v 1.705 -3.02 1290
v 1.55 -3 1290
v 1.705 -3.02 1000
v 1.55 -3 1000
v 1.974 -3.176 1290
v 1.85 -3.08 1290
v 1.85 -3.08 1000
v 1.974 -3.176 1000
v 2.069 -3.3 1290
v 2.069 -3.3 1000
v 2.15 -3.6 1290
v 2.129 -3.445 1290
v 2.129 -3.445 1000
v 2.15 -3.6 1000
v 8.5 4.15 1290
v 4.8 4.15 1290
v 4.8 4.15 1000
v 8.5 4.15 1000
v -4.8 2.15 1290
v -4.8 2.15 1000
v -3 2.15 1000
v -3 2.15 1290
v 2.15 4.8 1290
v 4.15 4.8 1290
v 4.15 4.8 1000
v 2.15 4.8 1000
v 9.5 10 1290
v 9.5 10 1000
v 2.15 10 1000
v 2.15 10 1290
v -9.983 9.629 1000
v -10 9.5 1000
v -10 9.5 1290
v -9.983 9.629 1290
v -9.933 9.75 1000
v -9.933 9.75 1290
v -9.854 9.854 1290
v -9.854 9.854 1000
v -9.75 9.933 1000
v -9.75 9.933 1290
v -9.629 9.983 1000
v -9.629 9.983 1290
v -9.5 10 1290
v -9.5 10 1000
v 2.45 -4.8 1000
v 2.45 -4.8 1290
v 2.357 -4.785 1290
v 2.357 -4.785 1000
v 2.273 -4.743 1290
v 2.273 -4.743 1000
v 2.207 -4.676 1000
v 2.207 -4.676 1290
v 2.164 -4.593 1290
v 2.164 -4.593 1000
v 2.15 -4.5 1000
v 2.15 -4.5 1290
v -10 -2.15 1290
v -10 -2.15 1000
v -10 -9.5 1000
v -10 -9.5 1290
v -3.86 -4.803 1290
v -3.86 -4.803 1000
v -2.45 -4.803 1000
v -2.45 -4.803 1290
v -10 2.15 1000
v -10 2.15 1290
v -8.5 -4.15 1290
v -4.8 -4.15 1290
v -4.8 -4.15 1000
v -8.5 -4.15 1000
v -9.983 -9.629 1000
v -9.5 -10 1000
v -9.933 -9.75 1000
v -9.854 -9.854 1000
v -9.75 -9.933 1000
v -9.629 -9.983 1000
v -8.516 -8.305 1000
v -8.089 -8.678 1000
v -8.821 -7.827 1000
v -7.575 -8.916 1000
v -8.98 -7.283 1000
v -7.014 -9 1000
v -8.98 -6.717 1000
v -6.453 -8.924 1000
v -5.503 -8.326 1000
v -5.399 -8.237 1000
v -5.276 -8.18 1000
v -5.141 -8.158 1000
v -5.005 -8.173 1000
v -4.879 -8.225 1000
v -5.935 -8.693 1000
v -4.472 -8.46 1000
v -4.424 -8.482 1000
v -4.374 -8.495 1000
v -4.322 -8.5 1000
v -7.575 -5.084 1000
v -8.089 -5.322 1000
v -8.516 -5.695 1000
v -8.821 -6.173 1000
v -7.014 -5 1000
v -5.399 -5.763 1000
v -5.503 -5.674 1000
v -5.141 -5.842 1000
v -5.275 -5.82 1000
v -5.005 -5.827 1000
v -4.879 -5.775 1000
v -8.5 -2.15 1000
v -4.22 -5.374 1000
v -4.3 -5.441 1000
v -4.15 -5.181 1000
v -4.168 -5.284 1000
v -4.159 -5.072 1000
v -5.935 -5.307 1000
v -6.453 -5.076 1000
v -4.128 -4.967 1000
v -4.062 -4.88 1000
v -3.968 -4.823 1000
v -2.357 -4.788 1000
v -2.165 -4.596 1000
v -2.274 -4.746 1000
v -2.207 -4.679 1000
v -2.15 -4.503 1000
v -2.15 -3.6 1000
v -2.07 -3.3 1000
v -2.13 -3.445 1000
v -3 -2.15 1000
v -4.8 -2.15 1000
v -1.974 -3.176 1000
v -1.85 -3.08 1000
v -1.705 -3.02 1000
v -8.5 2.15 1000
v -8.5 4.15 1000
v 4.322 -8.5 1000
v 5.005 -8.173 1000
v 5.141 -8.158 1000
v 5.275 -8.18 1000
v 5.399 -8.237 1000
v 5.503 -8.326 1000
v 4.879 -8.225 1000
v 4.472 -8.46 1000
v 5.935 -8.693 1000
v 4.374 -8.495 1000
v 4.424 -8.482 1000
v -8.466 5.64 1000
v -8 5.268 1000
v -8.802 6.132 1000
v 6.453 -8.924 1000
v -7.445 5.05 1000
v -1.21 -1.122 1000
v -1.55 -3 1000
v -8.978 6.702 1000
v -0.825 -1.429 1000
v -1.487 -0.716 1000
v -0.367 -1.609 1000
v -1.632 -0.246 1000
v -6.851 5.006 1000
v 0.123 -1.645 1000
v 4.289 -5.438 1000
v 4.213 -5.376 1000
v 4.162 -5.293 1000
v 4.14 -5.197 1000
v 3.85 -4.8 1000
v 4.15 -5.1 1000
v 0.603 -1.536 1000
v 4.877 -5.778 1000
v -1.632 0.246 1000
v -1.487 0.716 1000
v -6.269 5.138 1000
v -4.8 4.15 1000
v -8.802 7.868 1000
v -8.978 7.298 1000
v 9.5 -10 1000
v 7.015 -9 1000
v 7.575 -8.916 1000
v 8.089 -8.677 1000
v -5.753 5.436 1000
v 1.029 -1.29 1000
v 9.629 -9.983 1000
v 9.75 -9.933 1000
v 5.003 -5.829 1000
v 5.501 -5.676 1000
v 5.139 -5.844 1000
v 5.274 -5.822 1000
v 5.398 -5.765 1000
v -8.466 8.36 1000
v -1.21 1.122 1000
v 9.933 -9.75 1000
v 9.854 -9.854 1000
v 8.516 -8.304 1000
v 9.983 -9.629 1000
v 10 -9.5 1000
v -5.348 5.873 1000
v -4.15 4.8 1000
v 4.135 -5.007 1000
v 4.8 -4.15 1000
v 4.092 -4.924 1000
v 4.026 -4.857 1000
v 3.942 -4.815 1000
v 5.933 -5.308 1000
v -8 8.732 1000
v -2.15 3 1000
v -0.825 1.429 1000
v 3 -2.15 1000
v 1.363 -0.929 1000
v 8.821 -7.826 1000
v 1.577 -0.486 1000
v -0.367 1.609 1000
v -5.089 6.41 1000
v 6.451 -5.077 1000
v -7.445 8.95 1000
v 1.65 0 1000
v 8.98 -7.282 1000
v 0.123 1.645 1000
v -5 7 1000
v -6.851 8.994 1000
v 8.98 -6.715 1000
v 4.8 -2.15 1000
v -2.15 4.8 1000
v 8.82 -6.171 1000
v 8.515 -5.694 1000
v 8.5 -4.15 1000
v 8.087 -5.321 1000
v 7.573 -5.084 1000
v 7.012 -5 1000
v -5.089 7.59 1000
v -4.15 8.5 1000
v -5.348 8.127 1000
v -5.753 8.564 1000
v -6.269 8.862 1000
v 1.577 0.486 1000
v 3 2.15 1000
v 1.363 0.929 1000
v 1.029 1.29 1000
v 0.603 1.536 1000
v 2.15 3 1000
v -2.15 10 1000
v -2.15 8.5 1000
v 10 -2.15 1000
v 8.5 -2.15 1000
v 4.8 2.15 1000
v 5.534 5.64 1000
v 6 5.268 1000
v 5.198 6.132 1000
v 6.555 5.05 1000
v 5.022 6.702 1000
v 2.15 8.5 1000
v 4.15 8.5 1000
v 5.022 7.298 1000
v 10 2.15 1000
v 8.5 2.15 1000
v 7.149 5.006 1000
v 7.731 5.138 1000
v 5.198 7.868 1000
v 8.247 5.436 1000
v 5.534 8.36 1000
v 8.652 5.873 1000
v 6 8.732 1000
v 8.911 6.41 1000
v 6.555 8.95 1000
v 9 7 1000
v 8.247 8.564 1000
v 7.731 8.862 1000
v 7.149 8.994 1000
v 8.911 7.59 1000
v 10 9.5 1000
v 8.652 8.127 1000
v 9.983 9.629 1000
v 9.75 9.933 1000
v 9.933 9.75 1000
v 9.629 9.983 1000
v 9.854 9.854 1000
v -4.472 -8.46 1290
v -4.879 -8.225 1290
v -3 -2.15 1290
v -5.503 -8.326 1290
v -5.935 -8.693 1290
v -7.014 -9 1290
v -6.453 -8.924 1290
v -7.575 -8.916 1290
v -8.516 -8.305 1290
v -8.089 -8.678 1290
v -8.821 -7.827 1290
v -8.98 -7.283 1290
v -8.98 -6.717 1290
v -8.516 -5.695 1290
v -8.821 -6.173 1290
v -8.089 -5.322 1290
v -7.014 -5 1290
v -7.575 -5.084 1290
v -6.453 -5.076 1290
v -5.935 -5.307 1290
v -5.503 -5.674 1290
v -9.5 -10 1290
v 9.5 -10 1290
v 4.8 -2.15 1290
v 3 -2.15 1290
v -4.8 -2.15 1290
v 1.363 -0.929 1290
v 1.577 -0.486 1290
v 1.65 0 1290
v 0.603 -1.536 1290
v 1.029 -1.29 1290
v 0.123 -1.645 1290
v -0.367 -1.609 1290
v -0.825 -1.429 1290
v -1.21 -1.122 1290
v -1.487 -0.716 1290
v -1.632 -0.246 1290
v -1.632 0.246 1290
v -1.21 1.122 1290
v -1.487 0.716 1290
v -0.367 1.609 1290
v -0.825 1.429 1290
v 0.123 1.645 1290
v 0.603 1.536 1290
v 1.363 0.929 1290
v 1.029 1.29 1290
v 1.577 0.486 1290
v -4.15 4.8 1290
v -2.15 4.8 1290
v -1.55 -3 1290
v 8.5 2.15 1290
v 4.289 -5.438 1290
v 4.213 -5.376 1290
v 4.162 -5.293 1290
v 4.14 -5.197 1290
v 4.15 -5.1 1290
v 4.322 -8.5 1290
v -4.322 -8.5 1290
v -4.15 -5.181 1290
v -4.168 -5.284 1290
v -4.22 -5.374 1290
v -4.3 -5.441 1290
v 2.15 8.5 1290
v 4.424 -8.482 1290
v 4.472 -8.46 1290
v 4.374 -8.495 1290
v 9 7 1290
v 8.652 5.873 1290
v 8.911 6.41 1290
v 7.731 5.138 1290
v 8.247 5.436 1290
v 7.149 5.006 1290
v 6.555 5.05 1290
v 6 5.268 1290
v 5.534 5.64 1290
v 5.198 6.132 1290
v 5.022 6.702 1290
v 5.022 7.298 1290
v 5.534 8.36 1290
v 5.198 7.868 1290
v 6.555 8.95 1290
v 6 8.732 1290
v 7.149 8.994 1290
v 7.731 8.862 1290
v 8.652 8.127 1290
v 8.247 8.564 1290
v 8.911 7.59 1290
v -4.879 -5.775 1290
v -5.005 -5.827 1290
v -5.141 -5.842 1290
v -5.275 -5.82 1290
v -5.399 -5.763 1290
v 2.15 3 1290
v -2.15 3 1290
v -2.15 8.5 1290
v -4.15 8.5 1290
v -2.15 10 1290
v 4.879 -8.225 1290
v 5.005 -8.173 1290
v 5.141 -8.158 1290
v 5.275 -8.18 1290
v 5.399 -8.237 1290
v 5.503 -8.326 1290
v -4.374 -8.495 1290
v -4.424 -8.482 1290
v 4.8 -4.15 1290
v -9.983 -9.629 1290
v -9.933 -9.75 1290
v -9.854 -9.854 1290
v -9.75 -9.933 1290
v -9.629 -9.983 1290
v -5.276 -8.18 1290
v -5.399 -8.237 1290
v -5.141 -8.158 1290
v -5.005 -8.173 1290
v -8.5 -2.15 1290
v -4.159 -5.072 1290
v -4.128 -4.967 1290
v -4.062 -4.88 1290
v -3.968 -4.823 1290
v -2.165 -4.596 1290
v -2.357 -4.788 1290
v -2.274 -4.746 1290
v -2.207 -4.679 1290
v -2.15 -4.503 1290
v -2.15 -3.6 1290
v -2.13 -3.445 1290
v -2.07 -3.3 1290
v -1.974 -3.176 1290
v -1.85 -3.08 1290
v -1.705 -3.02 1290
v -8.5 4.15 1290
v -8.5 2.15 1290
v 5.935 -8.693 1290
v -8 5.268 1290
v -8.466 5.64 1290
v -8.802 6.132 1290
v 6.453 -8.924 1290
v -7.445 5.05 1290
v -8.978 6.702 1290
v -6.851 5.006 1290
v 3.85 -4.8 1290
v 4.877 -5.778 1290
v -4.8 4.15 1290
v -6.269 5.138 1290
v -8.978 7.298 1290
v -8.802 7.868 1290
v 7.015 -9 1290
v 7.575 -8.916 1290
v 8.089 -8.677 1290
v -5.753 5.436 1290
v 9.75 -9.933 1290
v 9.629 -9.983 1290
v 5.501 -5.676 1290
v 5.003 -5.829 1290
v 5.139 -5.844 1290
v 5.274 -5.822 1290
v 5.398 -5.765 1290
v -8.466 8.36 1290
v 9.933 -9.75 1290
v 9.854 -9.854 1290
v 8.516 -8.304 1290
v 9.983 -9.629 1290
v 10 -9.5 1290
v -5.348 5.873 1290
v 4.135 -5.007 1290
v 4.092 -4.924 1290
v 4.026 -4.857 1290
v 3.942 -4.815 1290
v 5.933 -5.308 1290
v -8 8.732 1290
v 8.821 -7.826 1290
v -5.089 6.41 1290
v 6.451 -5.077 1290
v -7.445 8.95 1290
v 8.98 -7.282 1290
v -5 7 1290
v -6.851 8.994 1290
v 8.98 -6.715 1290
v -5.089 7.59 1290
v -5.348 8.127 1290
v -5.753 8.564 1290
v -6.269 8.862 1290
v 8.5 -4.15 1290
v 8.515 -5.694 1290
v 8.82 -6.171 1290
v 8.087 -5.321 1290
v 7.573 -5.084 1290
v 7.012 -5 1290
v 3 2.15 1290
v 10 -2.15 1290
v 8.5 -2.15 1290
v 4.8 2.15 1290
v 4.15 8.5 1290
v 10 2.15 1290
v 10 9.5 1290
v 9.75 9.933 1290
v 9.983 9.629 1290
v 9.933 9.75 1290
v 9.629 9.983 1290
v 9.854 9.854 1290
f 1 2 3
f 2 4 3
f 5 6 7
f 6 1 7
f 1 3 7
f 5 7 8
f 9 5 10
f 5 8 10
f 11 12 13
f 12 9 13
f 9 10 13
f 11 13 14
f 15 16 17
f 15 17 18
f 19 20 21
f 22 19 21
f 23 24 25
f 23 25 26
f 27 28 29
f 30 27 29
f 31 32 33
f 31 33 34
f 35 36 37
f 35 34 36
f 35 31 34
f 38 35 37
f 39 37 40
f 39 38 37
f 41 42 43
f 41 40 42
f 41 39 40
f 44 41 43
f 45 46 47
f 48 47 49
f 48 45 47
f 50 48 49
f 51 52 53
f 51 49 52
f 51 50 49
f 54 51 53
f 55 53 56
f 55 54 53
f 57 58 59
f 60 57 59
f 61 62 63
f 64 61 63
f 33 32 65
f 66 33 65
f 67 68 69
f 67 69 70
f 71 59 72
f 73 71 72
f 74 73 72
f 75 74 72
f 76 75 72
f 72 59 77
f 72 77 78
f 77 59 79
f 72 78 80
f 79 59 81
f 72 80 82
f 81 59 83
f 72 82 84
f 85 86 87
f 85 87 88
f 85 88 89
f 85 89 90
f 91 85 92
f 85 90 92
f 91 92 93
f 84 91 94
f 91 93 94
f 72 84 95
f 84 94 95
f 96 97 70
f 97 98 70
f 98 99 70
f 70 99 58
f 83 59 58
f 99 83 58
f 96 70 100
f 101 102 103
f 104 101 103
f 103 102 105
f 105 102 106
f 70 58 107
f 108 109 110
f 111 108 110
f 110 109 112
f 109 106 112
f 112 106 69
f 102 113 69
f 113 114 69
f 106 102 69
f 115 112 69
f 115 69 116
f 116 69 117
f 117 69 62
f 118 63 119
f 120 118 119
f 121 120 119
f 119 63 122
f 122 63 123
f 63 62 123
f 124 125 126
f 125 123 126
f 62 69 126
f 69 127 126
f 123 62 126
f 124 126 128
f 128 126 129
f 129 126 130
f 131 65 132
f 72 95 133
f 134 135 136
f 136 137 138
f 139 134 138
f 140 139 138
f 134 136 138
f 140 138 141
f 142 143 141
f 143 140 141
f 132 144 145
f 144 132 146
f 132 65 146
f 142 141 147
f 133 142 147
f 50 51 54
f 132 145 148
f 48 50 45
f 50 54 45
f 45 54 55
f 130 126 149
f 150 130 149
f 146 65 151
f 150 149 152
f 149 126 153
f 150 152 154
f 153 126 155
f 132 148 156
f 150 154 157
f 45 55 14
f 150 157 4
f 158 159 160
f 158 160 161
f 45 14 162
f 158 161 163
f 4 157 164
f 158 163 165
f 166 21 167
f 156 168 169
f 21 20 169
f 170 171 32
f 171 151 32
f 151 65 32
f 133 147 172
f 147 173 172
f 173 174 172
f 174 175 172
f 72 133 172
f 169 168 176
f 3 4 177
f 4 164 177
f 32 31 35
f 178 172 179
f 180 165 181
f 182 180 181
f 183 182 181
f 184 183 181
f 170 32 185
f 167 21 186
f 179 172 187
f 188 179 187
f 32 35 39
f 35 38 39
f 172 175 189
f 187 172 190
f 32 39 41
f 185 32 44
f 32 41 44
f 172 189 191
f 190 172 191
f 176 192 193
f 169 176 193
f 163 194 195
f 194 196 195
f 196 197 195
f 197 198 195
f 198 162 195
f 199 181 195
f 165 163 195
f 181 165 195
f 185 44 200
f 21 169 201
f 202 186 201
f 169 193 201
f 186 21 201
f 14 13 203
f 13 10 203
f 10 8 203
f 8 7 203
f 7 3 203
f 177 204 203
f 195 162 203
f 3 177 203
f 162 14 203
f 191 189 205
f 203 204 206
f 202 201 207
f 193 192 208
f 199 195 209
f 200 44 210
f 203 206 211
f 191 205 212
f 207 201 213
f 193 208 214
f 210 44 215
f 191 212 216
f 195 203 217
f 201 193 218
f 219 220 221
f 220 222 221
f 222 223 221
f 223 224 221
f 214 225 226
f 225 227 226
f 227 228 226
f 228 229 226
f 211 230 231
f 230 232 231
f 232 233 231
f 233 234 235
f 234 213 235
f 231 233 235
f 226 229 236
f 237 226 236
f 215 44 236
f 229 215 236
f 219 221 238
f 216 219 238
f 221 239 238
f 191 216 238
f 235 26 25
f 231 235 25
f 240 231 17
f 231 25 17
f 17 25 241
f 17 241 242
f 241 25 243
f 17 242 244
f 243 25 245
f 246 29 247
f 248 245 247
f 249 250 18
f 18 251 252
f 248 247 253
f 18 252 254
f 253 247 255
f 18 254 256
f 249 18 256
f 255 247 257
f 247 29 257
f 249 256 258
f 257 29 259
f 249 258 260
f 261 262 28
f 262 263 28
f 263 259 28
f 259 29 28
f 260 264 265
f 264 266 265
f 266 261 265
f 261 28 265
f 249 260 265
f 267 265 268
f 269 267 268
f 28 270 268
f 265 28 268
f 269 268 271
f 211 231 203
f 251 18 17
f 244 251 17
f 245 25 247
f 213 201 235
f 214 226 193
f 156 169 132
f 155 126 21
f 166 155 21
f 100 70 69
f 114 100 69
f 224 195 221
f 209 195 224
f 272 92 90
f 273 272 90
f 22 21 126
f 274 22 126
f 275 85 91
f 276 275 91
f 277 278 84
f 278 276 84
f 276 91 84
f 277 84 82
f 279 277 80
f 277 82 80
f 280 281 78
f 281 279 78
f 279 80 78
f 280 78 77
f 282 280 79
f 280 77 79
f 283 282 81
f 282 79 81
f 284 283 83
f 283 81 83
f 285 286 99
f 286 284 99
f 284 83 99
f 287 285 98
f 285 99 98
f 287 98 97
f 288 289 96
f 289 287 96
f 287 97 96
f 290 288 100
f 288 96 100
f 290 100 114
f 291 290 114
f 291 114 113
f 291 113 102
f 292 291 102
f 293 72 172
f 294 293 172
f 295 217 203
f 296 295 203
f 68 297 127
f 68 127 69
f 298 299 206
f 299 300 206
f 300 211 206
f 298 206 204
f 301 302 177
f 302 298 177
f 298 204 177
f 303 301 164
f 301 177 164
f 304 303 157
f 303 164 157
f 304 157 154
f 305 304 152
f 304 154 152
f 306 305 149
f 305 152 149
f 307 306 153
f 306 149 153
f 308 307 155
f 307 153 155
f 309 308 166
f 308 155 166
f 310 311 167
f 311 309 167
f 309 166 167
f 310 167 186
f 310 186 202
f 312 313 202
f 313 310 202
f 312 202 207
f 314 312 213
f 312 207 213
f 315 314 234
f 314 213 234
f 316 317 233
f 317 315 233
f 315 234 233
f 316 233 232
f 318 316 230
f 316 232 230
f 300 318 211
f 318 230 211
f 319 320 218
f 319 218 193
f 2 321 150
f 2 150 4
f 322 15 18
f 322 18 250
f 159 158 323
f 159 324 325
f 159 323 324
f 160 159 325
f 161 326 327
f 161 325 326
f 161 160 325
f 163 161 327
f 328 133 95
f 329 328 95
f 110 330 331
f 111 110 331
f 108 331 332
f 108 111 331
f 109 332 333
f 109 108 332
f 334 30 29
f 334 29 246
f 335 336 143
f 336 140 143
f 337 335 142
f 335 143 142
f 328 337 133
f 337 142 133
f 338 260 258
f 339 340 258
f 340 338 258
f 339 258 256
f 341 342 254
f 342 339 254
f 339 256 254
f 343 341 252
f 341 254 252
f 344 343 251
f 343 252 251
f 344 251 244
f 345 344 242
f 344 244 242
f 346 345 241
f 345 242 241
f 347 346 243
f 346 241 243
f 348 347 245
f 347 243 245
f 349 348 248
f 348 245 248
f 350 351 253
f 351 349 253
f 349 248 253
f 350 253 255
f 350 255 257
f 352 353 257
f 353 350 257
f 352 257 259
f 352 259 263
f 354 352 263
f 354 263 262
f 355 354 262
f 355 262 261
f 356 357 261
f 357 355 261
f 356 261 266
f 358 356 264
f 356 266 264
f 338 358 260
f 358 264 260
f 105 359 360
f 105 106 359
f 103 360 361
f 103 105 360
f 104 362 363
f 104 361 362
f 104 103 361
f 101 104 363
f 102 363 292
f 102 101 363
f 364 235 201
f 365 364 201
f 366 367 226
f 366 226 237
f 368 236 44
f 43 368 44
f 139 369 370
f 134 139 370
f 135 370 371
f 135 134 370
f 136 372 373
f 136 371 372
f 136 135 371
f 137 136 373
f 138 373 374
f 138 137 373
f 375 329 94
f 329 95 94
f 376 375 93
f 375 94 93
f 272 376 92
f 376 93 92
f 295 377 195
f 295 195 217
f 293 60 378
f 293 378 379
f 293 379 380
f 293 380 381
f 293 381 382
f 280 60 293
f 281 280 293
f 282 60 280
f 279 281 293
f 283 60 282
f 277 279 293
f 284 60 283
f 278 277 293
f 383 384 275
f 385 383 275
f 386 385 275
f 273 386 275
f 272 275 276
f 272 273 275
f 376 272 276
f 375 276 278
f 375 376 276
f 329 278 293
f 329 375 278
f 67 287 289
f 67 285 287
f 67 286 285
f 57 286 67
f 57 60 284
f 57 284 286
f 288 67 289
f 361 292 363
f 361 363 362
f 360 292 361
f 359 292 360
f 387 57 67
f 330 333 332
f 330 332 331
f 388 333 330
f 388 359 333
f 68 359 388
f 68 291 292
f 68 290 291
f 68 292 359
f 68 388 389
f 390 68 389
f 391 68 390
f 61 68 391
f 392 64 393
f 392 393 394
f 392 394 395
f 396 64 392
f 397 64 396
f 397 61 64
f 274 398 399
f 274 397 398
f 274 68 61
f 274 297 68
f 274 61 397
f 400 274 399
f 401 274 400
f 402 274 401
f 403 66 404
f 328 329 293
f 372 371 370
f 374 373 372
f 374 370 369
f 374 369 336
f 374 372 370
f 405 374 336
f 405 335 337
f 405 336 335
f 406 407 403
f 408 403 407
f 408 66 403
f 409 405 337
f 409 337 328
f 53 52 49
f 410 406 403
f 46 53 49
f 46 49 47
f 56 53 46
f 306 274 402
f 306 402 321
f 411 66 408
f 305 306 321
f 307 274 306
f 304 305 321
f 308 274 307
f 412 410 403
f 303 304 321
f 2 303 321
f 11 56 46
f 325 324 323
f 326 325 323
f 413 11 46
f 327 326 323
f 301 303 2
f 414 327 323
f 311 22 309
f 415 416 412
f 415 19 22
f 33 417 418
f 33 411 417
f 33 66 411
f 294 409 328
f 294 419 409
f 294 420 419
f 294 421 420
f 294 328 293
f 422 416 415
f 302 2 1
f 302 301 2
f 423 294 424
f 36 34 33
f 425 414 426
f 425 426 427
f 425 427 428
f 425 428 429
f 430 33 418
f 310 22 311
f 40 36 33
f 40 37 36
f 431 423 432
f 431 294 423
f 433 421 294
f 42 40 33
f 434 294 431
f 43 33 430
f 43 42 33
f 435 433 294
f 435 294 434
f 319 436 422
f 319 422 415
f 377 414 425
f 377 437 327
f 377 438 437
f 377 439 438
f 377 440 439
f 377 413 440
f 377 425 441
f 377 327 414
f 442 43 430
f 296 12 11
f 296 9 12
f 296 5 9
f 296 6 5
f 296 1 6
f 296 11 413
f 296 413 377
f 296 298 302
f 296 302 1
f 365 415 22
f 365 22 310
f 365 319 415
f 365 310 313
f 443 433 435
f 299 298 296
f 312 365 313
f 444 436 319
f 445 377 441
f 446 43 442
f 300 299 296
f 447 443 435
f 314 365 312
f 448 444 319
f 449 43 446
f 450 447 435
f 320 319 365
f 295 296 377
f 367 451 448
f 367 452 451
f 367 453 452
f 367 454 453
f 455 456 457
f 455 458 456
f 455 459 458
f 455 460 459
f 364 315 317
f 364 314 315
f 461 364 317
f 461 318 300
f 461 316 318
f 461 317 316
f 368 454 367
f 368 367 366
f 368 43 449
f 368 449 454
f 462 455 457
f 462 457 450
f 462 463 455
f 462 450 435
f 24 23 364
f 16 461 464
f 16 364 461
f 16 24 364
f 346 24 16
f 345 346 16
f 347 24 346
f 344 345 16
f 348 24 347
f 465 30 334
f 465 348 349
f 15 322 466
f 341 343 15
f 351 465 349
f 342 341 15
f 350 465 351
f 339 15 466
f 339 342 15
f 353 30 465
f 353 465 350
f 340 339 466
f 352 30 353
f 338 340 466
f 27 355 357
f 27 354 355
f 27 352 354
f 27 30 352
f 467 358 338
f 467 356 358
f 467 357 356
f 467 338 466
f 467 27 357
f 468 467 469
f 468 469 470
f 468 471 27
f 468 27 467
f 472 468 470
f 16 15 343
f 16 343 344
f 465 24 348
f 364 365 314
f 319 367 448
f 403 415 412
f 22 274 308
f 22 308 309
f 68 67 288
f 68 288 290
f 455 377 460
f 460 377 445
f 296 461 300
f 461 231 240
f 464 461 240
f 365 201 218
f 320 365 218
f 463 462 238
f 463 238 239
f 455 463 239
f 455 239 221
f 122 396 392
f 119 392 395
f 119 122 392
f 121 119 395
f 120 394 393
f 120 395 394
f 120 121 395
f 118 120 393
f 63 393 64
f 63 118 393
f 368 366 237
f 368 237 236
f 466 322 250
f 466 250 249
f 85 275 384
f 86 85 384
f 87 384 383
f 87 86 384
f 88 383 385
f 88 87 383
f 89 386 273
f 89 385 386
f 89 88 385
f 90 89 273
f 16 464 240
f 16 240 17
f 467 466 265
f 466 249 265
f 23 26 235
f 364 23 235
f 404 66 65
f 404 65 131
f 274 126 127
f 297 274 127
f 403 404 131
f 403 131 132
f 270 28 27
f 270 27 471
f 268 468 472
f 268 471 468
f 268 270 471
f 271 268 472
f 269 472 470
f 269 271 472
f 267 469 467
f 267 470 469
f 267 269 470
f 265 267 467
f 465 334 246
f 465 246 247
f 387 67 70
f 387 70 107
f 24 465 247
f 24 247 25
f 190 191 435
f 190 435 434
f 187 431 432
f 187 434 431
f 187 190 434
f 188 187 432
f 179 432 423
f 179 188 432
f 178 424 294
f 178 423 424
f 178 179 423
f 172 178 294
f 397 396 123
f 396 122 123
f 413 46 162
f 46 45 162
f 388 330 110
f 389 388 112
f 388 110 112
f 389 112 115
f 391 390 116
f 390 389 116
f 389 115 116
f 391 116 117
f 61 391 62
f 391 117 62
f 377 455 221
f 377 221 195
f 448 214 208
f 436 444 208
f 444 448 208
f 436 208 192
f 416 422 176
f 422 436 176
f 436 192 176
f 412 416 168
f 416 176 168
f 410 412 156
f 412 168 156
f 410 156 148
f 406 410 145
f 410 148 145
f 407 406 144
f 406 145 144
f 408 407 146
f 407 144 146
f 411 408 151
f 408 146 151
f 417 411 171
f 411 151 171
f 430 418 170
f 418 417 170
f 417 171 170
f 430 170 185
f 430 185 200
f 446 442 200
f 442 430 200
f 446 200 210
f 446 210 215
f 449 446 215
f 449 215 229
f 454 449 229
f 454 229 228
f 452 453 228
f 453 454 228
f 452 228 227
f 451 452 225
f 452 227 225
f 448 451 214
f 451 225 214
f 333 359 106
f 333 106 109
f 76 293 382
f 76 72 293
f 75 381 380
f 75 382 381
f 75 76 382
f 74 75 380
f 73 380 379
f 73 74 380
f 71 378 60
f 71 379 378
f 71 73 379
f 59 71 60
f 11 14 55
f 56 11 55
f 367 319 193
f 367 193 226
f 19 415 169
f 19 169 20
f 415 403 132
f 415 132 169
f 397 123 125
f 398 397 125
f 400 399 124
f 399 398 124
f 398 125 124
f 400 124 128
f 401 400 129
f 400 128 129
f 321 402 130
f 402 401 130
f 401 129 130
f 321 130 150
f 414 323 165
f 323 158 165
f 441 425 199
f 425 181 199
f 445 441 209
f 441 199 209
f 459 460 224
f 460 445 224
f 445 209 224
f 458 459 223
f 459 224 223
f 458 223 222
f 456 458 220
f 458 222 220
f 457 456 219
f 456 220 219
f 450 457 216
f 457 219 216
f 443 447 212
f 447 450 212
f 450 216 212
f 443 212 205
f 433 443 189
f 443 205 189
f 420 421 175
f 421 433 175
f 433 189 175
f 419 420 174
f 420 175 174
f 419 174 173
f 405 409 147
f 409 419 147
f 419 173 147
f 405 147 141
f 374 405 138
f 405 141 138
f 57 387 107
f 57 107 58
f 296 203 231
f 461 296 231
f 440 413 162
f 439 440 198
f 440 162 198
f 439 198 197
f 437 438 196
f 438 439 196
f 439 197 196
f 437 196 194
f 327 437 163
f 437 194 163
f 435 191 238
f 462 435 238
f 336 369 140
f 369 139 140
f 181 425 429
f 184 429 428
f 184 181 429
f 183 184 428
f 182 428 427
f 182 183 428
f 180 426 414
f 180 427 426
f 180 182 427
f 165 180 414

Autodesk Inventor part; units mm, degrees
ref_plane "YZ Plane" through (0, 0, 0) normal (1, 0, 0) x (0, 1, 0)
ref_plane "XZ Plane" through (0, 0, 0) normal (0, 1, 0) x (-1, 0, 0)
ref_plane "作業平面1" through (-9.5, -10, 1000) normal (0, 0, 1) x (1, 0, 0)
sketch "スケッチ1" plane through (-9.5, -10, 1000) normal (0, 0, 1) x (1, 0, 0)
  line L0 (7.35, 18.5) -> (7.35, 20) projected
  line L1 (7.35, 20) -> (0, 20) projected
  arc A0 (0, 20) -> (-0.5, 19.5) centre (0, 19.5) ccw projected
  line L2 (-0.5, 19.5) -> (-0.5, 12.15) projected
  line L3 (-0.5, 12.15) -> (1, 12.15) projected
  line L4 (1, 12.15) -> (1, 14.15) projected
  line L5 (1, 14.15) -> (4.7, 14.15) projected
  line L6 (4.7, 14.15) -> (4.7, 12.15) projected
  line L7 (4.7, 12.15) -> (6.5, 12.15) projected
  line L8 (6.5, 12.15) -> (6.5, 7.85) projected
  line L9 (6.5, 7.85) -> (4.7, 7.85) projected
  line L10 (4.7, 7.85) -> (4.7, 5.85) projected
  line L11 (4.7, 5.85) -> (1, 5.85) projected
  line L12 (1, 5.85) -> (1, 7.85) projected
  line L13 (1, 7.85) -> (-0.5, 7.85) projected
  line L14 (-0.5, 7.85) -> (-0.5, 0.5) projected
  arc A1 (-0.5, 0.5) -> (0, 0) centre (0, 0.5) ccw projected
  line L15 (0, 0) -> (19, 0) projected
  arc A2 (19, 0) -> (19.5, 0.5) centre (19, 0.5) ccw projected
  line L16 (19.5, 0.5) -> (19.5, 7.85) projected
  line L17 (19.5, 7.85) -> (18, 7.85) projected
  line L18 (18, 7.85) -> (18, 5.85) projected
  line L19 (18, 5.85) -> (14.3, 5.85) projected
  line L20 (14.3, 5.85) -> (14.3, 7.85) projected
  line L21 (14.3, 7.85) -> (12.5, 7.85) projected
  line L22 (12.5, 7.85) -> (12.5, 12.15) projected
  line L23 (12.5, 12.15) -> (14.3, 12.15) projected
  line L24 (14.3, 12.15) -> (14.3, 14.15) projected
  line L25 (14.3, 14.15) -> (18, 14.15) projected
  line L26 (18, 14.15) -> (18, 12.15) projected
  line L27 (18, 12.15) -> (19.5, 12.15) projected
  line L28 (19.5, 12.15) -> (19.5, 19.5) projected
  arc A3 (19.5, 19.5) -> (19, 20) centre (19, 19.5) ccw projected
  line L29 (19, 20) -> (11.65, 20) projected
  line L30 (11.65, 20) -> (11.65, 18.5) projected
  line L31 (11.65, 18.5) -> (13.65, 18.5) projected
  line L32 (13.65, 18.5) -> (13.65, 14.8) projected
  line L33 (13.65, 14.8) -> (11.65, 14.8) projected
  line L34 (11.65, 14.8) -> (11.65, 13) projected
  line L35 (11.65, 13) -> (7.35, 13) projected
  line L36 (7.35, 13) -> (7.35, 14.8) projected
  line L37 (7.35, 14.8) -> (5.35, 14.8) projected
  line L38 (5.35, 14.8) -> (5.35, 18.5) projected
  line L39 (5.35, 18.5) -> (7.35, 18.5) projected
  arc A4 (11.6496, 6.4) -> (11.0496, 7) centre (11.0496, 6.4) ccw projected
  line L40 (11.6496, 6.4) -> (11.6496, 5.5) projected
  arc A5 (11.6496, 5.5) -> (11.9496, 5.2) centre (11.9496, 5.5) ccw projected
  line L41 (11.9496, 5.2) -> (13.3496, 5.2) projected
  arc A6 (13.6496, 4.9) -> (13.3496, 5.2) centre (13.3496, 4.9) ccw projected
  arc A7 (13.6496, 4.9) -> (13.7891, 4.5617) centre (13.9391, 4.8215) ccw projected
  line L42 (13.7891, 4.5617) -> (14.3769, 4.2223) projected
  arc A8 (14.3769, 4.2223) -> (15.0013, 4.3244) centre (14.6267, 4.6555) ccw projected
  arc A9 (15.0029, 1.6738) -> (15.0013, 4.3244) centre (16.5, 3) ccw projected
  arc A10 (15.0029, 1.6738) -> (14.3787, 1.7753) centre (14.6287, 1.3422) ccw projected
  line L43 (14.3787, 1.7753) -> (13.9715, 1.5402) projected
  arc A11 (13.8215, 1.5) -> (13.9715, 1.5402) centre (13.8215, 1.8) ccw projected
  line L44 (13.8215, 1.5) -> (5.1785, 1.5) projected
  arc A12 (5.0285, 1.5402) -> (5.1785, 1.5) centre (5.1785, 1.8) ccw projected
  line L45 (5.0285, 1.5402) -> (4.6213, 1.7753) projected
  arc A13 (4.6213, 1.7753) -> (3.9971, 1.6738) centre (4.3713, 1.3422) ccw projected
  arc A14 (3.9971, 4.3262) -> (3.9971, 1.6738) centre (2.5, 3) ccw projected
  arc A15 (3.9971, 4.3262) -> (4.6213, 4.2247) centre (4.3713, 4.6578) ccw projected
  line L46 (4.6213, 4.2247) -> (5.2, 4.5588) projected
  arc A16 (5.2, 4.5588) -> (5.35, 4.8187) centre (5.05, 4.8187) ccw projected
  arc A17 (5.6395, 5.1972) -> (5.35, 4.8187) centre (5.6395, 4.8972) ccw projected
  line L47 (5.6395, 5.1972) -> (7.05, 5.1972) projected
  arc A18 (7.05, 5.1972) -> (7.35, 5.4972) centre (7.05, 5.4972) ccw projected
  line L48 (7.35, 5.4972) -> (7.35, 6.4) projected
  arc A19 (7.95, 7) -> (7.35, 6.4) centre (7.95, 6.4) ccw projected
  line L49 (7.95, 7) -> (11.0496, 7) projected
  circle A20 centre (2.5, 17) radius 2 projected
  circle A21 centre (16.5, 17) radius 2 projected
  circle A22 centre (9.5, 10) radius 1.65 projected
  point P0 (9.5, 10)
extrude "押し出し1" add sketch "スケッチ1" along normal blind 290
properties part number "AFSF-2020-4"
